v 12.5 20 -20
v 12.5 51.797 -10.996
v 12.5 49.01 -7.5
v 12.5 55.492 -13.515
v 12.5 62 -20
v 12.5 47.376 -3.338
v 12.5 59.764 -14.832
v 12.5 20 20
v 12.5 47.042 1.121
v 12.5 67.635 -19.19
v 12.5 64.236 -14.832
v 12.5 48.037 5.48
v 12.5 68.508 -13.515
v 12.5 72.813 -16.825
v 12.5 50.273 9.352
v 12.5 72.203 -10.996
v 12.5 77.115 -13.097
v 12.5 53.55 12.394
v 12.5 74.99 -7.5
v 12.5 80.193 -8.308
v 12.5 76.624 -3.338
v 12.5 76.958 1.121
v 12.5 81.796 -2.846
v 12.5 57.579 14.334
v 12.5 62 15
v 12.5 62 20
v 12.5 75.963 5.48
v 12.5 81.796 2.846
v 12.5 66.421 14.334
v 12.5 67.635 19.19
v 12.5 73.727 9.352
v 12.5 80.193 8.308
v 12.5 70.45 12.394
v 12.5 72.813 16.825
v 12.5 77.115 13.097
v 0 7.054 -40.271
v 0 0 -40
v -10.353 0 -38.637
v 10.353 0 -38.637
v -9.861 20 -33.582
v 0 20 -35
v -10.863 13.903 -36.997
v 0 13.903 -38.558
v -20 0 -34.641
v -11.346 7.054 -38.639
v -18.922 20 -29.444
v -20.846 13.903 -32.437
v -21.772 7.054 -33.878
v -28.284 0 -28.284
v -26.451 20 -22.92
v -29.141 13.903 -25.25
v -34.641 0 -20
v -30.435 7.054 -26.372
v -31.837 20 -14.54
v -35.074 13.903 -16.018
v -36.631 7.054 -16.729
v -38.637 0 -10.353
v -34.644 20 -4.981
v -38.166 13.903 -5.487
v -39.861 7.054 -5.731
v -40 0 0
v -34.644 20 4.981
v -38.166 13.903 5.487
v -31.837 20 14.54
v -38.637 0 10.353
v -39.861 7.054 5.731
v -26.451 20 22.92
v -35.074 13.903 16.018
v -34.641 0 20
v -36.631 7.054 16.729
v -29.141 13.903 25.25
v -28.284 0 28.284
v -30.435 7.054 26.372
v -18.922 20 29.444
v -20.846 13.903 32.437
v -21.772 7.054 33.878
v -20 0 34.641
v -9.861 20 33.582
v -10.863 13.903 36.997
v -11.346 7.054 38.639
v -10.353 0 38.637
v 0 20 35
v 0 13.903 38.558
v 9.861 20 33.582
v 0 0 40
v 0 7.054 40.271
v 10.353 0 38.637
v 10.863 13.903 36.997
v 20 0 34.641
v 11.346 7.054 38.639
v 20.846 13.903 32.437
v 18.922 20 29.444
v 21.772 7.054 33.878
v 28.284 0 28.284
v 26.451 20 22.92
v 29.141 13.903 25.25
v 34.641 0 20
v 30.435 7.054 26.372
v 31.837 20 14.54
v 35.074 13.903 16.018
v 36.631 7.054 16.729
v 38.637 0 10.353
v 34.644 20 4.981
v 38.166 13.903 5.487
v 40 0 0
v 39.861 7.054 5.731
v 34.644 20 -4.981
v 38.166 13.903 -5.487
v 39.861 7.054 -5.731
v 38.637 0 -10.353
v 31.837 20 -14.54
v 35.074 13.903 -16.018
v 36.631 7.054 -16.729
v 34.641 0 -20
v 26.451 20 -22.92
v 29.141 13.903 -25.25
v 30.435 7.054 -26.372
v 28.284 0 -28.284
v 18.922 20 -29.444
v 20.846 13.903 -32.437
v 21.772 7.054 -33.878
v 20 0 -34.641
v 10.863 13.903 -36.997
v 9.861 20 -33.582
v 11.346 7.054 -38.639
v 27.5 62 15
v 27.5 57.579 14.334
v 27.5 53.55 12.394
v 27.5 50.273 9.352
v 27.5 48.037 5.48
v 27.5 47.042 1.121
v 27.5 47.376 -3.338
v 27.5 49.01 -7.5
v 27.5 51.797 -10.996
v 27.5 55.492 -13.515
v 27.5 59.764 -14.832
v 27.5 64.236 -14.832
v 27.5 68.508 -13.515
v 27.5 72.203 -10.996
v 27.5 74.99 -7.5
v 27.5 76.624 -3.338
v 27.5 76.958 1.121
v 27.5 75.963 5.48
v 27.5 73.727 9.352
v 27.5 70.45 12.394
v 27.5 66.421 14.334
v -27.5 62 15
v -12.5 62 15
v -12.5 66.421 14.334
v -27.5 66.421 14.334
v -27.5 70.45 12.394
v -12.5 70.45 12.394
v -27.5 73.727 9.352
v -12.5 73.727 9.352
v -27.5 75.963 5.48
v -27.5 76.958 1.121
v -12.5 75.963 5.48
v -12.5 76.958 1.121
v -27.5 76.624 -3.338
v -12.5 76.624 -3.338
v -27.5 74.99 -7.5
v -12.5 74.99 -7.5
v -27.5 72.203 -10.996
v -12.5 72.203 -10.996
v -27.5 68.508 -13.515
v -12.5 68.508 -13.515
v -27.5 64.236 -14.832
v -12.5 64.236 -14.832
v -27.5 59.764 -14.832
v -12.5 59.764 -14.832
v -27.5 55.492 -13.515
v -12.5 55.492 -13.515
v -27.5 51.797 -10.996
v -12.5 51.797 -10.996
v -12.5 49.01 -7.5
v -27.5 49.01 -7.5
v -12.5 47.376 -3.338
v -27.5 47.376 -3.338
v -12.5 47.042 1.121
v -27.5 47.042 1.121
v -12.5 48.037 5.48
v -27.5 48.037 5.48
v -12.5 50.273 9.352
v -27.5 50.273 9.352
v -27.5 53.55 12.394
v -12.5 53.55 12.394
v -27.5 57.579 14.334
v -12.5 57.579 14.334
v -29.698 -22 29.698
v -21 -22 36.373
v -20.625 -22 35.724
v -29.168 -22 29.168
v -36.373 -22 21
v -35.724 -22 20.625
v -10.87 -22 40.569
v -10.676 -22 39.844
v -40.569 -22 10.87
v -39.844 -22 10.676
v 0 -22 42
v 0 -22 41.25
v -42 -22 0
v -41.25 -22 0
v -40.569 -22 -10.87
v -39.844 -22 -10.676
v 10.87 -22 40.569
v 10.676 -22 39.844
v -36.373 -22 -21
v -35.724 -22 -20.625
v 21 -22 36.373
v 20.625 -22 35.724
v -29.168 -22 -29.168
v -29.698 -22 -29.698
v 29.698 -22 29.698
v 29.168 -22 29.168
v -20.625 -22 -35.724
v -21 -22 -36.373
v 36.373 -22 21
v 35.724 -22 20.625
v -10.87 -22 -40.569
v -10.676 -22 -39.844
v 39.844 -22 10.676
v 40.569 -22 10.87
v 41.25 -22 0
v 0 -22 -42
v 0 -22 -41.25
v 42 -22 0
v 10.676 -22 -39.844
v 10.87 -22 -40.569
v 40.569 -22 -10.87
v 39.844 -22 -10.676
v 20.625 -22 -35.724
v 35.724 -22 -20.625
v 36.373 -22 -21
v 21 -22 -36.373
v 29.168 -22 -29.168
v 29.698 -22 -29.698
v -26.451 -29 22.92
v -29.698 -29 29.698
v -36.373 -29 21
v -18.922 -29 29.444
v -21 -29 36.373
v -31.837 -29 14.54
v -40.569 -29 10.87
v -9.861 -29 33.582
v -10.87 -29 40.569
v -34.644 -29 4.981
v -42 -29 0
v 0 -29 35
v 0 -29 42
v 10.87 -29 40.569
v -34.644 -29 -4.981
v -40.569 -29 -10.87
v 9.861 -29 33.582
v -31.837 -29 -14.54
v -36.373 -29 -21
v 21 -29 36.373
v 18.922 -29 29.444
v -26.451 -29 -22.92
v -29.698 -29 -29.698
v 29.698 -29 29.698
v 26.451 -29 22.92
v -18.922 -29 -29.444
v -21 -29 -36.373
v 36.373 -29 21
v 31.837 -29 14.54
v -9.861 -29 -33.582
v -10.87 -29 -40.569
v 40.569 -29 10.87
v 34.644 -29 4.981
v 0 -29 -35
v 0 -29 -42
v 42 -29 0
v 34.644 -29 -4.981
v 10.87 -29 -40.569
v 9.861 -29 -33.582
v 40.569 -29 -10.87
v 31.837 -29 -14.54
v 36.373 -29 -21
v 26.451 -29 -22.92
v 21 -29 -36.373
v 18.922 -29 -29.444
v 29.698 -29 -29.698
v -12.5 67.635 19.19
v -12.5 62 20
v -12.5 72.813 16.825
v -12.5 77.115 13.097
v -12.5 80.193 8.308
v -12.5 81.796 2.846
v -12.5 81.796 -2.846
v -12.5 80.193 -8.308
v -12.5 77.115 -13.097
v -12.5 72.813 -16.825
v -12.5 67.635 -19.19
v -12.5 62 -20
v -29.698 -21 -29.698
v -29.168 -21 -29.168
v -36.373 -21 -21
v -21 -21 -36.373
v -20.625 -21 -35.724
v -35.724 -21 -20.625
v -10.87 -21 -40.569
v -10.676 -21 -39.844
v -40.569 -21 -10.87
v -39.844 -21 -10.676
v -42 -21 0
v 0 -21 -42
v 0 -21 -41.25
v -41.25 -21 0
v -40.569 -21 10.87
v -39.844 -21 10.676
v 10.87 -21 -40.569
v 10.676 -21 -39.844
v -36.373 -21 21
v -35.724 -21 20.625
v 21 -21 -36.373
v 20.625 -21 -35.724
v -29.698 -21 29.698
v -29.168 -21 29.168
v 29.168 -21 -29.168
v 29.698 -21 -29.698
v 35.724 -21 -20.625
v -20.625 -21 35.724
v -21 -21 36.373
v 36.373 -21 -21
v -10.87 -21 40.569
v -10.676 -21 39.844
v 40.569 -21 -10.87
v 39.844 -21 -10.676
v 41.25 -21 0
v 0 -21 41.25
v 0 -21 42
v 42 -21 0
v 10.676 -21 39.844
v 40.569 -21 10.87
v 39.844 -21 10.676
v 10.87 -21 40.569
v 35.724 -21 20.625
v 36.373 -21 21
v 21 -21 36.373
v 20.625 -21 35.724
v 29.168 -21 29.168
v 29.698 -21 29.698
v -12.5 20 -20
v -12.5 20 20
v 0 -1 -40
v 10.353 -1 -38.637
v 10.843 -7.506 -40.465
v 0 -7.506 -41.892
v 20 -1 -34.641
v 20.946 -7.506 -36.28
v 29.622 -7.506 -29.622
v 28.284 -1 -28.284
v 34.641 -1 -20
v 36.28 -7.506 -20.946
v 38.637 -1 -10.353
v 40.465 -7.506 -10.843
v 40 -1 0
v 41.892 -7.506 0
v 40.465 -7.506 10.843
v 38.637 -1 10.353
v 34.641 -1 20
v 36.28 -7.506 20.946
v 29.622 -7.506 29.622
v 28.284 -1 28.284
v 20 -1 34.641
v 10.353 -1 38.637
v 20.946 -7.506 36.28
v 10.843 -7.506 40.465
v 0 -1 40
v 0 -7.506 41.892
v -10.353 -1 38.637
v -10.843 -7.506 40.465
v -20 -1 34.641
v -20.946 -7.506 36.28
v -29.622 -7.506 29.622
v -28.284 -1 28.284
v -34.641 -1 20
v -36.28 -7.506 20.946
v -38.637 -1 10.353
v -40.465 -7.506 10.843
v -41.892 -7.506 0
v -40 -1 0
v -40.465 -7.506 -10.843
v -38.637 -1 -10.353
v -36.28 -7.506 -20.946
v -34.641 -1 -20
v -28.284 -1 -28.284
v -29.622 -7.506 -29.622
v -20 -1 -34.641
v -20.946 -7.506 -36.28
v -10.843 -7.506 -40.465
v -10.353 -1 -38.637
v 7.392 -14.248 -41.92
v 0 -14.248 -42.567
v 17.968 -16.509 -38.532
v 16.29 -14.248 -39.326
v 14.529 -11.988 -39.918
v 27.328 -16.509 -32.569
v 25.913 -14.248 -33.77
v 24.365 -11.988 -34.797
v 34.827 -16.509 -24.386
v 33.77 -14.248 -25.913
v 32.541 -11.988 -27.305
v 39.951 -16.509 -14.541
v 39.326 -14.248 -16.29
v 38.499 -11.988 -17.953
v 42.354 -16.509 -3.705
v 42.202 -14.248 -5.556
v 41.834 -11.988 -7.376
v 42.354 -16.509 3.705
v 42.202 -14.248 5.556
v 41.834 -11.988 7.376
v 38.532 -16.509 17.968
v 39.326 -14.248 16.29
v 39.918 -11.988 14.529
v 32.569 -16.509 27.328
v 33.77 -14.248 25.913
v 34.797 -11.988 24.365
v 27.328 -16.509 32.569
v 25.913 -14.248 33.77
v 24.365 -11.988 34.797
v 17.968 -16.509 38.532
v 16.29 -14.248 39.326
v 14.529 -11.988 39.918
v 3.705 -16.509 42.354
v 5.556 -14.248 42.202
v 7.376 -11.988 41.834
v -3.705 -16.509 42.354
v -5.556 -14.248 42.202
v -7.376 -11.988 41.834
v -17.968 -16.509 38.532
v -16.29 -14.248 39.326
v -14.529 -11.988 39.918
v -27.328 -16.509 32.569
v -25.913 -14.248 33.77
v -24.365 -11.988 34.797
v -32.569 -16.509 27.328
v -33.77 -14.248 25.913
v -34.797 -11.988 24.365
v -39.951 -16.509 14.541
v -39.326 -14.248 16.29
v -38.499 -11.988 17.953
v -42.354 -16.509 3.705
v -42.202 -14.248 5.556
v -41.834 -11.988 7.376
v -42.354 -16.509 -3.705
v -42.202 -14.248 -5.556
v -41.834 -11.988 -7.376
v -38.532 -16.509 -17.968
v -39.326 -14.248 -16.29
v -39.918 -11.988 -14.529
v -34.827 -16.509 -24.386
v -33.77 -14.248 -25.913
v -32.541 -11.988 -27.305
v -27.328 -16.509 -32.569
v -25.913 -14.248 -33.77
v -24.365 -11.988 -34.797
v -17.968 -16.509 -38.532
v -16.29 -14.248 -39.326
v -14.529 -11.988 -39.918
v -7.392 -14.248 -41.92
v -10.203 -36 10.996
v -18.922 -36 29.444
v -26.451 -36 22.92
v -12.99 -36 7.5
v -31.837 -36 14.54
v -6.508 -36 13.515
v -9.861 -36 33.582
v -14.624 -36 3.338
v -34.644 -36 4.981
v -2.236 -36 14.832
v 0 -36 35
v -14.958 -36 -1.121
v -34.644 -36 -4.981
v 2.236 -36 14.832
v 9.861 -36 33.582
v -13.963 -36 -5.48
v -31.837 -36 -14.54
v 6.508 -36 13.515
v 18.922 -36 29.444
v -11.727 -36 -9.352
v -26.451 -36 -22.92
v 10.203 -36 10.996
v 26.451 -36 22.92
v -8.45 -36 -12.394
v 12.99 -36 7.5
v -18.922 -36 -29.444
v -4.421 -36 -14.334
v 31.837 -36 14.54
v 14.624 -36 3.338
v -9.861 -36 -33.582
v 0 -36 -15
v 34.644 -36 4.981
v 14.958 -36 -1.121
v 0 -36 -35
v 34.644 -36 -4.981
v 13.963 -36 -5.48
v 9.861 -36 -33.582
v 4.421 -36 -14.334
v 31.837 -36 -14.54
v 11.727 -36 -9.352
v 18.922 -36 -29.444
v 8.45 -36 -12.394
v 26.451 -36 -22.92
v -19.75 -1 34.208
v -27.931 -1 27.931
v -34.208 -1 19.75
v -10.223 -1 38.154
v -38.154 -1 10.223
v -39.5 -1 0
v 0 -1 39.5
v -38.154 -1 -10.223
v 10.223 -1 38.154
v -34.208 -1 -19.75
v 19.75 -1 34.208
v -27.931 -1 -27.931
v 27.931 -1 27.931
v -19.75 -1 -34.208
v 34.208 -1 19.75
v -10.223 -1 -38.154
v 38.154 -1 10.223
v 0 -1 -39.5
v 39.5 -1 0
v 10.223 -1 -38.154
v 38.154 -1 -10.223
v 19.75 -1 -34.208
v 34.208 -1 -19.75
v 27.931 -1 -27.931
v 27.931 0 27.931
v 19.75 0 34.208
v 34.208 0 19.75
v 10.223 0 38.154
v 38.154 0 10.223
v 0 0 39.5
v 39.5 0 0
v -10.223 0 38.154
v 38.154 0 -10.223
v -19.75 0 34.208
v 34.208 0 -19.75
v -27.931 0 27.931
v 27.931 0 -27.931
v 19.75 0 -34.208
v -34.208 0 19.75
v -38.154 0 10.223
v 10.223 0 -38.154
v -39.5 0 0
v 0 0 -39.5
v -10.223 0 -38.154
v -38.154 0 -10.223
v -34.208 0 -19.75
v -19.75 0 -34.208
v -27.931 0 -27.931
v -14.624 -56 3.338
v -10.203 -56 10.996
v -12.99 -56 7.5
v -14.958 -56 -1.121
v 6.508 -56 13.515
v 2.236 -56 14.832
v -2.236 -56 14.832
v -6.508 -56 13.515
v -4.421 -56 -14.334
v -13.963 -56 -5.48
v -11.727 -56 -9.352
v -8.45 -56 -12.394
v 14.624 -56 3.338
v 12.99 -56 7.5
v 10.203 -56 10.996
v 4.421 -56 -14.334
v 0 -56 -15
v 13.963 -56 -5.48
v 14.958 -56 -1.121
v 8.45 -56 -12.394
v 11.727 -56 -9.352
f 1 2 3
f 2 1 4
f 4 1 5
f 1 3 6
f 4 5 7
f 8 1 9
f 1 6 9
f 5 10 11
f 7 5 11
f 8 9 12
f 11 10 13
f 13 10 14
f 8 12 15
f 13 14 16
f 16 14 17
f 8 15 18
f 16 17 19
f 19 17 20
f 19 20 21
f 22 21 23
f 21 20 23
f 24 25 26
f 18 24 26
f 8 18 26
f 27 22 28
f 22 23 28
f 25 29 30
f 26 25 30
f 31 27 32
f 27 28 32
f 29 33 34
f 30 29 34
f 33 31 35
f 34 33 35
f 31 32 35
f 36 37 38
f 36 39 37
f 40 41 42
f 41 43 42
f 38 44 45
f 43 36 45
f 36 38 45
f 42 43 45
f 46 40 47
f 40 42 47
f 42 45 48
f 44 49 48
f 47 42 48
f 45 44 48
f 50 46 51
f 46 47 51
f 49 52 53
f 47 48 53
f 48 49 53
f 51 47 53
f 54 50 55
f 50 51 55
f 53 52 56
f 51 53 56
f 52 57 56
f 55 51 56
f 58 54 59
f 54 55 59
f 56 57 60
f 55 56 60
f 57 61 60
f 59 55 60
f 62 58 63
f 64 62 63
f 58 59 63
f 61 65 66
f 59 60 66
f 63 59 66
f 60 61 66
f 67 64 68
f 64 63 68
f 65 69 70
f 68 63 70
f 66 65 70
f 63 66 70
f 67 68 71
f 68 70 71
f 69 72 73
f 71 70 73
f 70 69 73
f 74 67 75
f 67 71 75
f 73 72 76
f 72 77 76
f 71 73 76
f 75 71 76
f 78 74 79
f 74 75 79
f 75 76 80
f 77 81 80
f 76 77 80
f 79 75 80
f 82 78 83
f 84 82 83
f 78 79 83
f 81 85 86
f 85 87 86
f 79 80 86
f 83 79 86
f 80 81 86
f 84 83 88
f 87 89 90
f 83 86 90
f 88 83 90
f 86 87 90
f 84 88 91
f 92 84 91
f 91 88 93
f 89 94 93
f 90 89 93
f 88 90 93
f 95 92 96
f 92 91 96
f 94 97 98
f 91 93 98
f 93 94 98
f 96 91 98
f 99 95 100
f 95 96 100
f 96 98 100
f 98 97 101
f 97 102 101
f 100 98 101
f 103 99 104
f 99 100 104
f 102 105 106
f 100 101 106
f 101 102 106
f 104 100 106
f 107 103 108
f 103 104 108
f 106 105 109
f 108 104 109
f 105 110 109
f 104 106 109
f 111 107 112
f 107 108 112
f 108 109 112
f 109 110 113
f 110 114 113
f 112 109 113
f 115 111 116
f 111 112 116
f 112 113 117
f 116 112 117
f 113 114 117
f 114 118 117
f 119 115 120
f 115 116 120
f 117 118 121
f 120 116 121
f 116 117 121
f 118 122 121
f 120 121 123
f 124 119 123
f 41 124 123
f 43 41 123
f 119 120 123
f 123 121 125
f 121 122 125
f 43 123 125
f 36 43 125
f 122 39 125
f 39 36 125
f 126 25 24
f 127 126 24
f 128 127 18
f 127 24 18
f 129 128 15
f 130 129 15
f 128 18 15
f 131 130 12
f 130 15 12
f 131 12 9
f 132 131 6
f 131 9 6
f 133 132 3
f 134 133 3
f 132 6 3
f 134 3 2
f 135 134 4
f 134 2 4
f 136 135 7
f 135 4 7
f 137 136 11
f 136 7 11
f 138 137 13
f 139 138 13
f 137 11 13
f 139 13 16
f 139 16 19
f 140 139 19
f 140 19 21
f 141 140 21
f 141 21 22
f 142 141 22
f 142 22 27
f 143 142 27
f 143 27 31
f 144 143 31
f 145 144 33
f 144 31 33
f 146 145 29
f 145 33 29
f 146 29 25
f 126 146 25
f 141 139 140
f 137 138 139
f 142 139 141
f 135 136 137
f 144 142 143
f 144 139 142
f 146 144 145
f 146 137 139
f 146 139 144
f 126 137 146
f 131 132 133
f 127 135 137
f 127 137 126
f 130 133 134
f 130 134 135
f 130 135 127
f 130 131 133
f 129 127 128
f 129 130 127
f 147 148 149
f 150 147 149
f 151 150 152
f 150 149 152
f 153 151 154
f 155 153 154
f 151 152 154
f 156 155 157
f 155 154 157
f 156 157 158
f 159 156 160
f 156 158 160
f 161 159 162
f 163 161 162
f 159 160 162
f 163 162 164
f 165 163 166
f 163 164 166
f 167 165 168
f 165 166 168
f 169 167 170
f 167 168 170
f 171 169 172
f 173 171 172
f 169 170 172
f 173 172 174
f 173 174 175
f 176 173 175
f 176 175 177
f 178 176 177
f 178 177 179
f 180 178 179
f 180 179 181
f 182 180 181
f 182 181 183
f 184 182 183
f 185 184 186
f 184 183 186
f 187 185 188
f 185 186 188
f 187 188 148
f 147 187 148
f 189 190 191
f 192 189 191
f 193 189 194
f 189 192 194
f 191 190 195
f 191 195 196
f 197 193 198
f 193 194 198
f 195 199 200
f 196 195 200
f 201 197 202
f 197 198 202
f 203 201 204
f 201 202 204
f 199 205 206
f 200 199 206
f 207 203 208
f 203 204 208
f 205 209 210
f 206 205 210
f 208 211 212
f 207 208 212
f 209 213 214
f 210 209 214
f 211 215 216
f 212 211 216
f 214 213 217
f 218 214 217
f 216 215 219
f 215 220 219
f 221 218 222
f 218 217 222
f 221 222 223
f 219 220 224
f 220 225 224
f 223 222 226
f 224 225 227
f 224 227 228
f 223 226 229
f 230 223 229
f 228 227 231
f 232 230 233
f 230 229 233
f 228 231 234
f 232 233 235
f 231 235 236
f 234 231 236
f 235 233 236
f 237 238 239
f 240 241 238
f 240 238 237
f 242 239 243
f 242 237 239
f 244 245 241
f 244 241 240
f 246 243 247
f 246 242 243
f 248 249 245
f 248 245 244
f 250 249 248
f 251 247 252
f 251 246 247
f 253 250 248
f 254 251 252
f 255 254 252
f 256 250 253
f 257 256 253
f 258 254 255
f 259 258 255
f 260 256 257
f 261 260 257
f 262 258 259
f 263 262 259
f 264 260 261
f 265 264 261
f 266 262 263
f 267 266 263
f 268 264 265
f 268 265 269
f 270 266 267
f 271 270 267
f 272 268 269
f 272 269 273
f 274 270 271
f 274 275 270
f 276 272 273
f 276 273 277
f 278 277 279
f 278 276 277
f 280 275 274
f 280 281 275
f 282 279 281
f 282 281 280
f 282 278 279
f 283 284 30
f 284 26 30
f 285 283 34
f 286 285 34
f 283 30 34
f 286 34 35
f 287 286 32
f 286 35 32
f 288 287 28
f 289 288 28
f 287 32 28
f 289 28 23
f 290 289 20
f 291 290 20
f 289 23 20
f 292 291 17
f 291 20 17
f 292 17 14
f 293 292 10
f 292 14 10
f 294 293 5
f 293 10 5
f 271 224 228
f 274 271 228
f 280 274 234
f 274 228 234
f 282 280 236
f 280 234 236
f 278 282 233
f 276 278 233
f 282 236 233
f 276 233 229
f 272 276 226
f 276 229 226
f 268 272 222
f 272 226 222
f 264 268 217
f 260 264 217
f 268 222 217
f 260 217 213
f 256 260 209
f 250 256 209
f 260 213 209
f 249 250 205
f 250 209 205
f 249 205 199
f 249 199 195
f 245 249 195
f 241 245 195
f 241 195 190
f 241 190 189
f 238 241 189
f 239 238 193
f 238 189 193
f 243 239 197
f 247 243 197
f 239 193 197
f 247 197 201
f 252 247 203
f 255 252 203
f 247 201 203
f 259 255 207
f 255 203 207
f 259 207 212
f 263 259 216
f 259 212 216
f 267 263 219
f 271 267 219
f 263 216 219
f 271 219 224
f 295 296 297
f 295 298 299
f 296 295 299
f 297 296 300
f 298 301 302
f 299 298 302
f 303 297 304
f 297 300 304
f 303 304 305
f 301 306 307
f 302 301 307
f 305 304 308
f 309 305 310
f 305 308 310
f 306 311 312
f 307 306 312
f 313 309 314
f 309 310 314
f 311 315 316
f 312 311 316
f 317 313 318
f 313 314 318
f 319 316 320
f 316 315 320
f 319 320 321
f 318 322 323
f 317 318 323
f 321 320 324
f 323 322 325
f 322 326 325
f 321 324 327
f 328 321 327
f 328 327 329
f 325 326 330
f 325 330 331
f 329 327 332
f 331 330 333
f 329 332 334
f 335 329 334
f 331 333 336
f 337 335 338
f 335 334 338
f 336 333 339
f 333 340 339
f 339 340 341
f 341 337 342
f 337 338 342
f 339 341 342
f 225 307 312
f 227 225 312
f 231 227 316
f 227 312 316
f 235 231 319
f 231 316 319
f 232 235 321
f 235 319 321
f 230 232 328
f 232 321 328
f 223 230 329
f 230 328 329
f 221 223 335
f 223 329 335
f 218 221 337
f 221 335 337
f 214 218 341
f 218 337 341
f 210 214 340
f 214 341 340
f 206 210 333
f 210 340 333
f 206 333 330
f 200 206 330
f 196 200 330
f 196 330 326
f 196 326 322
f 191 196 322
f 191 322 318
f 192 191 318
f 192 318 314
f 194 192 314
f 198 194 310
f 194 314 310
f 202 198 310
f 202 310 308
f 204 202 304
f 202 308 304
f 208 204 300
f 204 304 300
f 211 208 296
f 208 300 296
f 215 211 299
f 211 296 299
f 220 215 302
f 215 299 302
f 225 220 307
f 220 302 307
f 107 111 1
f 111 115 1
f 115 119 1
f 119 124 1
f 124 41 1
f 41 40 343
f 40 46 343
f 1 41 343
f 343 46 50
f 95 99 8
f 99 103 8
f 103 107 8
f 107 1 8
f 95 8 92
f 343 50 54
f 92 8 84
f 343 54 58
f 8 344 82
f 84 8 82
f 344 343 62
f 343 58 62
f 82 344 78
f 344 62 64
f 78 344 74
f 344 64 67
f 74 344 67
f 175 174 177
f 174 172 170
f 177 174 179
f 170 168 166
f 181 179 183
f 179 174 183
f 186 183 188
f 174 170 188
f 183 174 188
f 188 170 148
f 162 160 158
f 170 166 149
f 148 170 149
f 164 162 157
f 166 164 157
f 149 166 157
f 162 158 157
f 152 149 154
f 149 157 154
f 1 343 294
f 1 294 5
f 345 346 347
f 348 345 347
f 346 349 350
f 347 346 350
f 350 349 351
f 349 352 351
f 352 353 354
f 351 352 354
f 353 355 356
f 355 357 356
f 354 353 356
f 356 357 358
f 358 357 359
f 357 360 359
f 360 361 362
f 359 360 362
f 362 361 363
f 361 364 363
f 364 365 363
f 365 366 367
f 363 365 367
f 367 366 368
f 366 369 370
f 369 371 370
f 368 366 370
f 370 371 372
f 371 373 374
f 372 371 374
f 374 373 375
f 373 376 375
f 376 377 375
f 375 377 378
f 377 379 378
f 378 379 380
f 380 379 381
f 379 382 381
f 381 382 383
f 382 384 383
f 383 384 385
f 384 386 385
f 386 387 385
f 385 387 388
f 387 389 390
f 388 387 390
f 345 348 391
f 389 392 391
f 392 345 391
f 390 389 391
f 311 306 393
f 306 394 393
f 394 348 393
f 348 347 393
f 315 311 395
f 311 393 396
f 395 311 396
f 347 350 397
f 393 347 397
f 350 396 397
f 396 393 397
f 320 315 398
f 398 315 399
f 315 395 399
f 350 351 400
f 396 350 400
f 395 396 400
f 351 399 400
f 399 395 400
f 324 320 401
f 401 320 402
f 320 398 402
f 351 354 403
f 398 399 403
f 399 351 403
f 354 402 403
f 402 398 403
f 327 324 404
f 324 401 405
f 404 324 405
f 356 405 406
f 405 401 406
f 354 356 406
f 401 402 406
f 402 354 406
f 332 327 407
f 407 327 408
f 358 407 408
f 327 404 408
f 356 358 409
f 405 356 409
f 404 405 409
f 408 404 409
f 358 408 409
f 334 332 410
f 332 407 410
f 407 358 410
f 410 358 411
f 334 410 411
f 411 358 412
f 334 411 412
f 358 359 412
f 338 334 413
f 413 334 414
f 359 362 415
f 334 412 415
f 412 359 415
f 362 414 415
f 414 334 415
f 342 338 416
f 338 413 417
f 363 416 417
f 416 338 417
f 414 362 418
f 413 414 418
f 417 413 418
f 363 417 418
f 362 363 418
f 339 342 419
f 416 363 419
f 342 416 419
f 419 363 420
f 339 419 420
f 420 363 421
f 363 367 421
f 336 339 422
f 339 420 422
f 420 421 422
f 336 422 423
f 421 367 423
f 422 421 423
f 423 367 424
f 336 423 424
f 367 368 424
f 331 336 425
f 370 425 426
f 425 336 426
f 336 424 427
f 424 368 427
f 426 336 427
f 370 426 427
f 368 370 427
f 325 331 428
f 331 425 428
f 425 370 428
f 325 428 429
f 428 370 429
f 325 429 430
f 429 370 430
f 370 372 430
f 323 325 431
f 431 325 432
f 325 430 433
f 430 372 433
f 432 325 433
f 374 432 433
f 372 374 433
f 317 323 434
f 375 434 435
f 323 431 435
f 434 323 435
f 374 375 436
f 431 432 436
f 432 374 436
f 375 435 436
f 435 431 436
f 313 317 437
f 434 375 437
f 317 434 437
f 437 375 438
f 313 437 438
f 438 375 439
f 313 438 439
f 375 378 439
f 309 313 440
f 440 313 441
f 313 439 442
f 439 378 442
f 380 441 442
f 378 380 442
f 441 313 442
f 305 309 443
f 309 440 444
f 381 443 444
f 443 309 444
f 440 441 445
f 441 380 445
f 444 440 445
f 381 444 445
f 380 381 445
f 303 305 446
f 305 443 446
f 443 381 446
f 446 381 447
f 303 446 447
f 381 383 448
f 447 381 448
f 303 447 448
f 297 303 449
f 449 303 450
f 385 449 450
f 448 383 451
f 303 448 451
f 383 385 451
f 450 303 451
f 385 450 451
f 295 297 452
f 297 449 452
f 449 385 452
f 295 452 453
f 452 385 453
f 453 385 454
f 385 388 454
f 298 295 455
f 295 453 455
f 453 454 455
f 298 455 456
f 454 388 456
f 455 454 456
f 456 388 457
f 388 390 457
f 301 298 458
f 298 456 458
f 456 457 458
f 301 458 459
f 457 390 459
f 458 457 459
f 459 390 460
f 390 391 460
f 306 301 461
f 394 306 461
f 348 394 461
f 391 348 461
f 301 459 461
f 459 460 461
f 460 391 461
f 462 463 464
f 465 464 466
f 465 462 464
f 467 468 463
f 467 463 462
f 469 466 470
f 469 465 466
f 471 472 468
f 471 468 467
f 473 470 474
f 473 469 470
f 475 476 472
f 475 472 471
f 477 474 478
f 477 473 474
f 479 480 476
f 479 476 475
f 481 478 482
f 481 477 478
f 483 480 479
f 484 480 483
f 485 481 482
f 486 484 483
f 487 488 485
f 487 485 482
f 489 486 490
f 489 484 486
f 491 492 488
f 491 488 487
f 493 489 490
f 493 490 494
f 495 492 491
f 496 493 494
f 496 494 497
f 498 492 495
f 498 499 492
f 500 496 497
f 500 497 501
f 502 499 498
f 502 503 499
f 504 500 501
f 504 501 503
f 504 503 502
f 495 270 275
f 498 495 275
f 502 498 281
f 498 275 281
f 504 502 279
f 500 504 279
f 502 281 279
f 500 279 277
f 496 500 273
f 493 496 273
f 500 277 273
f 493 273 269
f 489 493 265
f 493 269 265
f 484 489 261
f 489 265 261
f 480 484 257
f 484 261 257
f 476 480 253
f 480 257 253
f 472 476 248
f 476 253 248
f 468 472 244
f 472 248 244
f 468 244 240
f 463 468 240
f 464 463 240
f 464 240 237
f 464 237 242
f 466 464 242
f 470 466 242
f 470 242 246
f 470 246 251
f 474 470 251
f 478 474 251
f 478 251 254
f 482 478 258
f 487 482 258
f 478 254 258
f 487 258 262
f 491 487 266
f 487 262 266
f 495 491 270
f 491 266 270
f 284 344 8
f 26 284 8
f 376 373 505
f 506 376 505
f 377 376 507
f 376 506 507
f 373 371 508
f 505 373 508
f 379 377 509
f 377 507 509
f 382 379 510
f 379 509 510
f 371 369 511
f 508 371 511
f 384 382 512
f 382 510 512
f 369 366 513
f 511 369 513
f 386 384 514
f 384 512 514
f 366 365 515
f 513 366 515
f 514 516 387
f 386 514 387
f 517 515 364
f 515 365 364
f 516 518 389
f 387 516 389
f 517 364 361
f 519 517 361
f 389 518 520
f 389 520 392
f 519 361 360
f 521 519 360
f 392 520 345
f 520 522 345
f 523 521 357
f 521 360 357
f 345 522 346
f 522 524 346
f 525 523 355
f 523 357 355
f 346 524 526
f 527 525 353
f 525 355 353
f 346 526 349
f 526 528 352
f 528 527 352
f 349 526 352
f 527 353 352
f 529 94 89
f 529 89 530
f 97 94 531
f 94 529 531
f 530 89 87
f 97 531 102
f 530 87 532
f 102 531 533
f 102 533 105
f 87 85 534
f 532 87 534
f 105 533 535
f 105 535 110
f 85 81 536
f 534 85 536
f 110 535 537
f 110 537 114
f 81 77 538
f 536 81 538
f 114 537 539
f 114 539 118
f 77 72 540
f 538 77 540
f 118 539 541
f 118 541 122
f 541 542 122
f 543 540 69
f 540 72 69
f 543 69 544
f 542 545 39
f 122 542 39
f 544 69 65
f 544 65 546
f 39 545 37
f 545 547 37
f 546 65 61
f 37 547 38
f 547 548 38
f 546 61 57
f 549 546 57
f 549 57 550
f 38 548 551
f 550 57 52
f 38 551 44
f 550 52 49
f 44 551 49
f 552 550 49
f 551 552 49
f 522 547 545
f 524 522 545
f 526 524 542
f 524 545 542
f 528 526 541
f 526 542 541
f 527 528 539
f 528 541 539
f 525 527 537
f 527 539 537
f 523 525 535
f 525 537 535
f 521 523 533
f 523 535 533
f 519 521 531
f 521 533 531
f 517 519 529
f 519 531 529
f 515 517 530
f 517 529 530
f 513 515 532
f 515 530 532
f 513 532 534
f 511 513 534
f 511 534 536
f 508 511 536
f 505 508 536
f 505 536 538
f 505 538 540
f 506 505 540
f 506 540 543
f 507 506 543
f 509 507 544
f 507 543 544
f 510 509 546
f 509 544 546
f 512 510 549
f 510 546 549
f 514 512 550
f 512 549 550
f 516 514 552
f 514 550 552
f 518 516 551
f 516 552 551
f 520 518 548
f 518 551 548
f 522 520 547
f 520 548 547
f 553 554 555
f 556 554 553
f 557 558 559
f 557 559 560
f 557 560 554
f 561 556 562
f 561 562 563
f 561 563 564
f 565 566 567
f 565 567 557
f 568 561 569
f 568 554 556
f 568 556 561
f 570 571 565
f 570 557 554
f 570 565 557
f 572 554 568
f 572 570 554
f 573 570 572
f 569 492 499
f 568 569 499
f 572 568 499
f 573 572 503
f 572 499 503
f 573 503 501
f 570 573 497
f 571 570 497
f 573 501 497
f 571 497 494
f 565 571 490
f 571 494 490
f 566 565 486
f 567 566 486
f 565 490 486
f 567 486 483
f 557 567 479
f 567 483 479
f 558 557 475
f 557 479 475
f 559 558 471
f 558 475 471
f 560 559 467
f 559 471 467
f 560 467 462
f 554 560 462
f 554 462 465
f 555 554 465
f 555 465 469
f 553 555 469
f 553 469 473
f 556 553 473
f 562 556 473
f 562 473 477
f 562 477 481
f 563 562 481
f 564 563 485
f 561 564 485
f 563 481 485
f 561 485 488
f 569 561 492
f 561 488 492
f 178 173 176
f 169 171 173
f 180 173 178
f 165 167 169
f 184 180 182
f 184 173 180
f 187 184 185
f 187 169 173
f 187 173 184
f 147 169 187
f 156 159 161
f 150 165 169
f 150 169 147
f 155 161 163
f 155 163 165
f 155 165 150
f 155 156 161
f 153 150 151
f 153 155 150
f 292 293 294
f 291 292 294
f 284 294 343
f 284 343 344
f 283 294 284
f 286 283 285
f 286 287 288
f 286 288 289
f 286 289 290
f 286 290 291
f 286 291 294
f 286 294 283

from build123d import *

# Parameters (mm, degrees)
SKETCH2_R           = 39.5
BOSS_EXTRUDE1_DEPTH = 1
SKETCH4_R           = 41.25
BOSS_EXTRUDE2_DEPTH = 1
SKETCH5_R           = 42
BOSS_EXTRUDE3_DEPTH = 7
SKETCH6_R           = 35
BOSS_EXTRUDE4_DEPTH = 7
SKETCH7_R           = 15
BOSS_EXTRUDE5_DEPTH = 20
SKETCH8_W           = 25
SKETCH8_H           = 40
BOSS_EXTRUDE6_DEPTH = 42
BOSS_EXTRUDE7_DEPTH = 12.5
SKETCH11_R          = 15
BOSS_EXTRUDE8_DEPTH = 15
SKETCH12_R          = 15
BOSS_EXTRUDE9_DEPTH = 15


with BuildPart() as part:
    # Sketch1 → Revolve1 (revolve)
    with BuildSketch(Plane.XY, mode=Mode.PRIVATE) as revolve1_sk:
        with BuildLine():
            Line((0, 0), (0, 20))
            Line((0, 20), (-35, 20))
            ThreePointArc((-35, 20), (-39.657515479, 10.53937887), (-40, 0))
            Line((-40, 0), (0, 0))
        make_face()
    revolve(revolve1_sk.sketch.rotate(Axis((0, 0, 0), (0, 1, 0)), 270), axis=Axis((0, 0, 0), (0, 1, 0)))

    # Sketch2 → Boss-Extrude1 (add)
    with BuildSketch(Plane.XZ):
        with Locations(Location((0, 0, 0), (0, 0, 270))):
            Circle(SKETCH2_R)
    extrude(amount=BOSS_EXTRUDE1_DEPTH)

    # Sketch3 → Revolve2 (revolve)
    with BuildSketch(Plane(origin=(0, 0, 0), x_dir=(0, 0, -1), z_dir=(1, 0, 0)), mode=Mode.PRIVATE) as revolve2_sk:
        with BuildLine():
            Line((-40, -1), (0, -1))
            Line((0, -1), (0, -21))
            Line((0, -21), (-42, -21))
            ThreePointArc((-42, -21), (-42.384109041, -10.861589096), (-40, -1))
        make_face()
    revolve(revolve2_sk.sketch.rotate(Axis((0, -1, 0), (0, -1, 0)), 180), axis=Axis((0, -1, 0), (0, -1, 0)))

    # Sketch4 → Boss-Extrude2 (add)
    with BuildSketch(Plane.XZ.offset(21)):
        with Locations(Location((0, 0, 0), (0, 0, 270))):
            Circle(SKETCH4_R)
    extrude(amount=BOSS_EXTRUDE2_DEPTH)

    # Sketch5 → Boss-Extrude3 (add)
    with BuildSketch(Plane.XZ.offset(22)):
        with Locations(Location((0, 0, 0), (0, 0, 270))):
            Circle(SKETCH5_R)
    extrude(amount=BOSS_EXTRUDE3_DEPTH)

    # Sketch6 → Boss-Extrude4 (add)
    with BuildSketch(Plane.XZ.offset(29)):
        with Locations(Location((0, 0, 0), (0, 0, 270))):
            Circle(SKETCH6_R)
    extrude(amount=BOSS_EXTRUDE4_DEPTH)

    # Sketch7 → Boss-Extrude5 (add)
    with BuildSketch(Plane.XZ.offset(36)):
        with Locations(Location((0, 0, 0), (0, 0, 270))):
            Circle(SKETCH7_R)
    extrude(amount=BOSS_EXTRUDE5_DEPTH)

    # Sketch8 → Boss-Extrude6 (add)
    with BuildSketch(Plane(origin=(0, 20, 0), x_dir=(1, 0, 0), z_dir=(0, 1, 0))):
        Rectangle(SKETCH8_W, SKETCH8_H)
    extrude(amount=BOSS_EXTRUDE6_DEPTH)

    # Sketch10 → Boss-Extrude7 (add, symmetric)
    with BuildSketch(Plane(origin=(0, 0, 0), x_dir=(0, 0, -1), z_dir=(1, 0, 0))):
        with BuildLine():
            Line((20, 62), (-20, 62))
            ThreePointArc((-20, 62), (0, 82), (20, 62))
        make_face()
    extrude(amount=BOSS_EXTRUDE7_DEPTH, both=True)

    # Sketch12 → Boss-Extrude9 (add)
    with BuildSketch(Plane(origin=(12.5, 0, 0), x_dir=(0, 0, -1), z_dir=(1, 0, 0))):
        with Locations(Location((0, 62, 0), (0, 0, 180))):
            Circle(SKETCH12_R)
    extrude(amount=BOSS_EXTRUDE9_DEPTH)


with BuildPart() as body_2:
    # Sketch11 → Boss-Extrude8 (new body)
    with BuildSketch(Plane.ZY.offset(12.5)):
        with Locations((0, 62)):
            Circle(SKETCH11_R)
    extrude(amount=BOSS_EXTRUDE8_DEPTH)


solid = Compound([part.part, body_2.part])
